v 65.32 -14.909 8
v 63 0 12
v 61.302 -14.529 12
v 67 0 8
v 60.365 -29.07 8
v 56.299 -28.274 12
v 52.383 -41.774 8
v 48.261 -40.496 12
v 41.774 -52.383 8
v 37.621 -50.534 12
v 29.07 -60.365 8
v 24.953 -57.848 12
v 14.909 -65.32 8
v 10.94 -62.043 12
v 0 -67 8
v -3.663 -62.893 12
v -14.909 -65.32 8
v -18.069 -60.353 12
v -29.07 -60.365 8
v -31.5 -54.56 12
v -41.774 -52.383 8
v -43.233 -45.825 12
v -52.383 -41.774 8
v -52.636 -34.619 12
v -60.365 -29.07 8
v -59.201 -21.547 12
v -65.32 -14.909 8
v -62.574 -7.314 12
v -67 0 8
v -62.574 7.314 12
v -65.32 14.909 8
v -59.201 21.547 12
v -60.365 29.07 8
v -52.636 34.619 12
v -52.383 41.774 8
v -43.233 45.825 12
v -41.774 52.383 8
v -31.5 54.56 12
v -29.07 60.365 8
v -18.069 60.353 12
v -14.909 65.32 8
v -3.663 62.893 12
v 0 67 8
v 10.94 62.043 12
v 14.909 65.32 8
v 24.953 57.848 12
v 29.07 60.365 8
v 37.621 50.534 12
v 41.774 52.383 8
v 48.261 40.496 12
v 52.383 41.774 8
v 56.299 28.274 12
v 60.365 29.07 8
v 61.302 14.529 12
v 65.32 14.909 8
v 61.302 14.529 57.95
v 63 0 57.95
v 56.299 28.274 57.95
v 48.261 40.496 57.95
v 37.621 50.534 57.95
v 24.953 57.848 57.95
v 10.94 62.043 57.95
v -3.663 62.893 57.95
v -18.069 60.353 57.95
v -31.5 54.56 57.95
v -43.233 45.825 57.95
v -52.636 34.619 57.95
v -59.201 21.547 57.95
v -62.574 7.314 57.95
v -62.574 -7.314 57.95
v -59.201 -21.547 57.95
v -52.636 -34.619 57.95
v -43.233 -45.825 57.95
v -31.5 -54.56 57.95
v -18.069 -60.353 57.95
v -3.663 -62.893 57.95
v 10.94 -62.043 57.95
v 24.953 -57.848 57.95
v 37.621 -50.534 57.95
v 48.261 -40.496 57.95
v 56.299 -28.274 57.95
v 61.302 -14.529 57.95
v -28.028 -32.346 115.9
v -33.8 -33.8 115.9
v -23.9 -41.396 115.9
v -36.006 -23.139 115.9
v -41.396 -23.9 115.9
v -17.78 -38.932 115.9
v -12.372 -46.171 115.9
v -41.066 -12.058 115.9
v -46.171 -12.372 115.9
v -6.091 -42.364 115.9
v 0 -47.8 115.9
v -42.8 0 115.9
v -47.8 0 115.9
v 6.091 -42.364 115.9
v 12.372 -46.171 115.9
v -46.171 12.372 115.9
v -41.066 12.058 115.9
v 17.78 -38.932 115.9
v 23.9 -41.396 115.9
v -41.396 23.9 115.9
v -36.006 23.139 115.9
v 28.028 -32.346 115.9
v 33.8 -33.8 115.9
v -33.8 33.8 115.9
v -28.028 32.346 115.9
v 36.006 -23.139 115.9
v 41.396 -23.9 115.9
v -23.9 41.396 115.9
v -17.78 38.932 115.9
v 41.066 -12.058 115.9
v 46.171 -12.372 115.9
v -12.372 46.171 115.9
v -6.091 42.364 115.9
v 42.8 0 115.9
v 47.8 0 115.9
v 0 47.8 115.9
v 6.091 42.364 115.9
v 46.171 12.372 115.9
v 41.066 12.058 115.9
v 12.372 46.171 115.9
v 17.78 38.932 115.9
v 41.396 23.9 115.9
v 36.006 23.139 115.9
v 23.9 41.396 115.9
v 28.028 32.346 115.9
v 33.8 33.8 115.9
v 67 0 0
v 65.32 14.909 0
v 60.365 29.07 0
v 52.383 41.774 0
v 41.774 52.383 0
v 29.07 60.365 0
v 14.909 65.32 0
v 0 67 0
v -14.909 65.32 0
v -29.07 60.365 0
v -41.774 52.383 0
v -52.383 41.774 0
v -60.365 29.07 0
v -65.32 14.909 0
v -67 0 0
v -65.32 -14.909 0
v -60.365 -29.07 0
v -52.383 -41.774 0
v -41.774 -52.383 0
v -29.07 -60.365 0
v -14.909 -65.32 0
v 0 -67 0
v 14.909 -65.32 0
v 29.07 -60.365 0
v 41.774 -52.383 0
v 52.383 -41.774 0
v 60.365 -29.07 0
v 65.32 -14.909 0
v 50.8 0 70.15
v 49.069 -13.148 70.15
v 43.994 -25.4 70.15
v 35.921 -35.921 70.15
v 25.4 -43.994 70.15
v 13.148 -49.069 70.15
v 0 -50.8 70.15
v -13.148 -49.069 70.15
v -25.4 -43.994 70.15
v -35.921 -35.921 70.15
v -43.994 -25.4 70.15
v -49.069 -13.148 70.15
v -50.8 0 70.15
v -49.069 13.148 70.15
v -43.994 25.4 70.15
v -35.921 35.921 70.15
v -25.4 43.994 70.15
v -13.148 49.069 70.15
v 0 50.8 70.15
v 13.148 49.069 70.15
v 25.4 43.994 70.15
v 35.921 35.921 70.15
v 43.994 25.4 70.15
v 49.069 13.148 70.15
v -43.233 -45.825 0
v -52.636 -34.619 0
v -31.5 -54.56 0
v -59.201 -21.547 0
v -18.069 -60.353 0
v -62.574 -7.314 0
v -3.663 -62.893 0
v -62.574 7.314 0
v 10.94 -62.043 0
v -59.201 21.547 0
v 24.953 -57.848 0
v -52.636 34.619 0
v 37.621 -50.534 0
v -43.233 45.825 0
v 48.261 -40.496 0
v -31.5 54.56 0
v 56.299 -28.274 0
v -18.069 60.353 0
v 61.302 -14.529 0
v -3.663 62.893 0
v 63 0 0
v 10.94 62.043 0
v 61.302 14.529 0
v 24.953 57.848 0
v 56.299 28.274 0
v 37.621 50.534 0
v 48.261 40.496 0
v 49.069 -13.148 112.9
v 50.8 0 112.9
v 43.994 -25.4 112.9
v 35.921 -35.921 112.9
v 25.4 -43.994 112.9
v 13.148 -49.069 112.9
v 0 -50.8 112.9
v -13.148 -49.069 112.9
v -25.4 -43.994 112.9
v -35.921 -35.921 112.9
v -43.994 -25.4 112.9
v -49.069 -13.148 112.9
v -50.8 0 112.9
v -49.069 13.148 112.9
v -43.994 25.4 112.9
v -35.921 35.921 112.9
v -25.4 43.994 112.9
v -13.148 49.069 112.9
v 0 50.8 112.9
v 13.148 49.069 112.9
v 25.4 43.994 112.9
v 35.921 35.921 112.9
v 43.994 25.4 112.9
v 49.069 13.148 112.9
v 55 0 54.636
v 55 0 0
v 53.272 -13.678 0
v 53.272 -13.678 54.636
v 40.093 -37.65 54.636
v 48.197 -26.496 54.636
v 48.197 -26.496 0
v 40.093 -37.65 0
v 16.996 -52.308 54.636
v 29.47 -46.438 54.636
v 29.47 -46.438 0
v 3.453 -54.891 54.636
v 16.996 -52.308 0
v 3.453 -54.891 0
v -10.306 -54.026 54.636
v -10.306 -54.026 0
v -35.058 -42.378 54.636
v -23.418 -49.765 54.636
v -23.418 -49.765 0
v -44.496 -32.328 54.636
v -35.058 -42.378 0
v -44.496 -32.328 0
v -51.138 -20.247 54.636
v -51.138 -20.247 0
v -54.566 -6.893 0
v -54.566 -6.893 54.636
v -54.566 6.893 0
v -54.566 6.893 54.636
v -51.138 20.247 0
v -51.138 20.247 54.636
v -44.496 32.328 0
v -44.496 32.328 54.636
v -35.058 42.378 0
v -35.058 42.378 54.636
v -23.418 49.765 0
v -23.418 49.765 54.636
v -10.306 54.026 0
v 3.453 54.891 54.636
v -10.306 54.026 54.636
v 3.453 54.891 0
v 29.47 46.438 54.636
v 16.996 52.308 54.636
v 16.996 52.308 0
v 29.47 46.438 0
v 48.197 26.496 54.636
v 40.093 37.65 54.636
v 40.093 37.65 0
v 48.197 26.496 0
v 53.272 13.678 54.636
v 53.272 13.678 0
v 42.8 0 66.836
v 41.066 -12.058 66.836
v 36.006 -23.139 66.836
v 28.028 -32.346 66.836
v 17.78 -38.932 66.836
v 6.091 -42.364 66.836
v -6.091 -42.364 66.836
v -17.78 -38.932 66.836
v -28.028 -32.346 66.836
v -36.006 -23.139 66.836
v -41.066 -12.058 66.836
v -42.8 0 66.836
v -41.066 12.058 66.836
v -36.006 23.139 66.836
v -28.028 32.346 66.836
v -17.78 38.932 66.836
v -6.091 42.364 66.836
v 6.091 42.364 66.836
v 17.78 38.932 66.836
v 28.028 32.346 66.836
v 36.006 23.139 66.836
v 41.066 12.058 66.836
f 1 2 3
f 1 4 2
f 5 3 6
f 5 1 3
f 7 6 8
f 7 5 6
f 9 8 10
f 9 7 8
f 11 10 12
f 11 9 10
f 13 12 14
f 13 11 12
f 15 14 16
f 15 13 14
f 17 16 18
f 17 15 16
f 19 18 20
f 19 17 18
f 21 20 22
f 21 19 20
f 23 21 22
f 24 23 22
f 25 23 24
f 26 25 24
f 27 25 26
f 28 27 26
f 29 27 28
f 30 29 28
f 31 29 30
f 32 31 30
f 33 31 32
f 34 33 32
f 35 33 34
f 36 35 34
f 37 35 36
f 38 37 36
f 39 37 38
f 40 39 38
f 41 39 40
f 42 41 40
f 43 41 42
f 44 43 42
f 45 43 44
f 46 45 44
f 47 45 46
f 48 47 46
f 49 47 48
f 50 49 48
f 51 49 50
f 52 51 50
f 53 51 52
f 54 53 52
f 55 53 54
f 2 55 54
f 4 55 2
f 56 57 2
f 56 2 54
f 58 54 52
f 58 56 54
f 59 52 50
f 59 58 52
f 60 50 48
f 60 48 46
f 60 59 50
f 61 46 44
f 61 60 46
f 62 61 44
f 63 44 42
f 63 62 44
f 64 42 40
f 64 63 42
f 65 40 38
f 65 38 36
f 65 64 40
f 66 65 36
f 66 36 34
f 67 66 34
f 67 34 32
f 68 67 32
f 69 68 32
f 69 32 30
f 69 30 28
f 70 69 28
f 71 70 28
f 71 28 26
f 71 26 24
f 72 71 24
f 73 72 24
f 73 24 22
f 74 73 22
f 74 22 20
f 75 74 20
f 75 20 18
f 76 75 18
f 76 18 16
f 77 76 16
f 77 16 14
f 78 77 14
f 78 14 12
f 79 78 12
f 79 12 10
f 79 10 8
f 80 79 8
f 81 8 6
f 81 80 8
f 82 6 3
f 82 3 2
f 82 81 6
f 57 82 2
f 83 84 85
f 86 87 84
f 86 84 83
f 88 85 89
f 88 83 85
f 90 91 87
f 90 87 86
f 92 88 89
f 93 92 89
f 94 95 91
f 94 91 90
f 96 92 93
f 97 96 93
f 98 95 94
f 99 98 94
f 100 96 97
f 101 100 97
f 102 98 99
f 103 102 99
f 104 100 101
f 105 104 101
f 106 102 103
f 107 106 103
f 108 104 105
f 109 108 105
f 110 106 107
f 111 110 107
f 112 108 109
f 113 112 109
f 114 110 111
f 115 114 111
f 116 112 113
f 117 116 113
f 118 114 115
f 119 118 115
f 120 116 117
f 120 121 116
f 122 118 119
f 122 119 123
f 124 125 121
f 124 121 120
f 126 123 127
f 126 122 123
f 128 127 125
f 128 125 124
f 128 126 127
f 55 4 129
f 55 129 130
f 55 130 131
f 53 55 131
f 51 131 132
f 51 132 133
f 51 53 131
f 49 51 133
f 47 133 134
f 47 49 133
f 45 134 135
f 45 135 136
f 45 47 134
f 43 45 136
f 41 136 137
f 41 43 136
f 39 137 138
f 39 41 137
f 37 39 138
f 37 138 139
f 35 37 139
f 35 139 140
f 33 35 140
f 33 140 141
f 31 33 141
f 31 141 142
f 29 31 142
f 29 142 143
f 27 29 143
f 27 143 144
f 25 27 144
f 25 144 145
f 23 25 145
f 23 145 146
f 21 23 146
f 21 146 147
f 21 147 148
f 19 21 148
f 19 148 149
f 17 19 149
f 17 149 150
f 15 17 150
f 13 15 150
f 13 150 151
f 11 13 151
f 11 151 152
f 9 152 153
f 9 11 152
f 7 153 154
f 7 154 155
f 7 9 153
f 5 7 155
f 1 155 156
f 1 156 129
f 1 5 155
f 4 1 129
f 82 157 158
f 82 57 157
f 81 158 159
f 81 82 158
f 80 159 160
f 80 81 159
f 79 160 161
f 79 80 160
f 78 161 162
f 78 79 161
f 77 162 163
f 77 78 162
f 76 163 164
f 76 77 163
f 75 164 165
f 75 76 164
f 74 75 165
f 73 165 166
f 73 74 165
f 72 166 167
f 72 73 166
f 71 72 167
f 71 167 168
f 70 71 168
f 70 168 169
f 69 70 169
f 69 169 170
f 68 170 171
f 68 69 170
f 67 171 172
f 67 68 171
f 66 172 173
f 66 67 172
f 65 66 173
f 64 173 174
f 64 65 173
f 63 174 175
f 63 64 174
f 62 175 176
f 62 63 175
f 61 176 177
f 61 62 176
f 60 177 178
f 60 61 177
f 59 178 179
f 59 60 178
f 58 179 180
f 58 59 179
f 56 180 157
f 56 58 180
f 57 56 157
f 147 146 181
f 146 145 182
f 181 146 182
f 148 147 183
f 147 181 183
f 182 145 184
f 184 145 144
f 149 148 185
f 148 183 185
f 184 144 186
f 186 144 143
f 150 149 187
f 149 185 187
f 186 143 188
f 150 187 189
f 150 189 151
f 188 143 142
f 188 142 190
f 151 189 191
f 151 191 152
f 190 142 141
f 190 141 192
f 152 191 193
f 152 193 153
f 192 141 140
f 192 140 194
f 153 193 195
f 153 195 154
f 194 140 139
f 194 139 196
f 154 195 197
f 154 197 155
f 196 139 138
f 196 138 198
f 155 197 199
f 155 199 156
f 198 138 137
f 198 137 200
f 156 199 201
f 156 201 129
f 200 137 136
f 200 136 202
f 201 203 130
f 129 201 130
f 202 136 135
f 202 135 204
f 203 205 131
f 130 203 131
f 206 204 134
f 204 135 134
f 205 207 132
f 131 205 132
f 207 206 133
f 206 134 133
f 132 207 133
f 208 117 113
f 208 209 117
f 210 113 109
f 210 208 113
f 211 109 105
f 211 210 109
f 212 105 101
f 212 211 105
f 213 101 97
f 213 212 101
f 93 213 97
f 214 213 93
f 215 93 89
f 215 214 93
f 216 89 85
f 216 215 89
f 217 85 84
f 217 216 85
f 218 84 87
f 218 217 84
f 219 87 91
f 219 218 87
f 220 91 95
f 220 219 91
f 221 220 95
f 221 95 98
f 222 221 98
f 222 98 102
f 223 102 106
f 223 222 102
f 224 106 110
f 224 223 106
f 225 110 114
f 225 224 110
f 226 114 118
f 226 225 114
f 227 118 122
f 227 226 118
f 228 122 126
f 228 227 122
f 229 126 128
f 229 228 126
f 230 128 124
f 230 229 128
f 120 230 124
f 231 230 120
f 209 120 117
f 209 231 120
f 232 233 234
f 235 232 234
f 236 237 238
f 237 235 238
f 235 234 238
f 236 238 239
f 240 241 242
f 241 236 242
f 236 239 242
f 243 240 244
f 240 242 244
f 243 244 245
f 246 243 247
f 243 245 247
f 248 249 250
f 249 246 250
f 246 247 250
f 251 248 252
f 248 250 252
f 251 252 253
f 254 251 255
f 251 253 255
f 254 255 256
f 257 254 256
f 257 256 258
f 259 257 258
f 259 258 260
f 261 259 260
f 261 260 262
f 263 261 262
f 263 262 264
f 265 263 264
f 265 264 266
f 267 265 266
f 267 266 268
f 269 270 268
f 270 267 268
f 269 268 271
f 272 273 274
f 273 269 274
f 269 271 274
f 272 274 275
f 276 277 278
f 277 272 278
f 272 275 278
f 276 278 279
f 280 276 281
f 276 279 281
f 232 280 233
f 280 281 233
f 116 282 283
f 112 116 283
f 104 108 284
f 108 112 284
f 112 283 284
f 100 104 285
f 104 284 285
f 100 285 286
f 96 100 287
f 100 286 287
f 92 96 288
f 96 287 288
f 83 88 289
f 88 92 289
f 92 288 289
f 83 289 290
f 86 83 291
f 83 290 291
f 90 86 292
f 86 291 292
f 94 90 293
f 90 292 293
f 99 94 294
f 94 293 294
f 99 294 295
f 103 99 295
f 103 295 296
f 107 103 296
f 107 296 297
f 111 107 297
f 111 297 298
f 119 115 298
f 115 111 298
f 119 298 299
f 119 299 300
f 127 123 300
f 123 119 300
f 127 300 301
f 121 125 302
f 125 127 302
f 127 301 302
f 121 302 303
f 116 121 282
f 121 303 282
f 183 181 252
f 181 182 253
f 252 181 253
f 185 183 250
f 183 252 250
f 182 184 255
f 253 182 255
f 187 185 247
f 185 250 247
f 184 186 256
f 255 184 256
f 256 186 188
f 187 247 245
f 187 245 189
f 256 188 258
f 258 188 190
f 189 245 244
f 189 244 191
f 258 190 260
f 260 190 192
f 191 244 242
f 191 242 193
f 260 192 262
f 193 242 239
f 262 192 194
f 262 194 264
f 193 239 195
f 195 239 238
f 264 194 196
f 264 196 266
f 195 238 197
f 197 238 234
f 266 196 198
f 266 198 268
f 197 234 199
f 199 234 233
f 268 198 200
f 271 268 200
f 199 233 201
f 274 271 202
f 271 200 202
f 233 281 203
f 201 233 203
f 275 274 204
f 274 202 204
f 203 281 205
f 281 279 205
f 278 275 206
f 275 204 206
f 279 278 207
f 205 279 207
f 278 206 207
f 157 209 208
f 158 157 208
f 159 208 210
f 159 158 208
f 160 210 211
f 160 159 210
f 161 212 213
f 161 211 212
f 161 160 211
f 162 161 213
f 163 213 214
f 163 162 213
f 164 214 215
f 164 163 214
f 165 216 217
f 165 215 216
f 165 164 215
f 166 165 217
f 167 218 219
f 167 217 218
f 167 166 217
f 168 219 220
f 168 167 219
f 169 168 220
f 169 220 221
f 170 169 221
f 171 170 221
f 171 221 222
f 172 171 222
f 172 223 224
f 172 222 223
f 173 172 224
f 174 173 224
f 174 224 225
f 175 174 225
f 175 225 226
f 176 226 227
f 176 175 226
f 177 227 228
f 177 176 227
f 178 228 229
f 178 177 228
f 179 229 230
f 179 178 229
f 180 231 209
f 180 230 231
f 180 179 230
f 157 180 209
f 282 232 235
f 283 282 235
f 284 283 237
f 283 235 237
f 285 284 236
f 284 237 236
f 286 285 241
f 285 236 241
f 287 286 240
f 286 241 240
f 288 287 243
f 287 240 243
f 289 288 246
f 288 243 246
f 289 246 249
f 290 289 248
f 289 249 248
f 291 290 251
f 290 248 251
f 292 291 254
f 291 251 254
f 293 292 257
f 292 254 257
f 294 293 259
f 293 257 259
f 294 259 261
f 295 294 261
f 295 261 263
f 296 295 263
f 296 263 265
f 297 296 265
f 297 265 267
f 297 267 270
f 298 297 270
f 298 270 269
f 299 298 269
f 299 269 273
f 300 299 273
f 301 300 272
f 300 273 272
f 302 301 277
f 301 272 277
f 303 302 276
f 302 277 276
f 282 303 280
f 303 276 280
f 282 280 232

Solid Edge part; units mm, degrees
sketch "Sketch1" plane through (0, 0, 0) normal (0, -1, 0) x (1, 0, 0)
  line L0 (42.8, 115.9) -> (42.8, 66.8363)
  line L1 (42.8, 66.8363) -> (55, 54.6363)
  line L2 (55, 54.6363) -> (55, 0)
  line L3 (55, 0) -> (63, 0)
  line L4 (63, 0) -> (67, 0)
  line L5 (67, 0) -> (67, 8)
  line L6 (67, 8) -> (63, 12)
  line L7 (63, 12) -> (63, 57.95)
  line L8 (63, 57.95) -> (50.8, 70.15)
  line L9 (50.8, 115.9) -> (50.8, 70.15)
  line L10 (42.8, 115.9) -> (50.8, 115.9)
revolve "RevolvedProtrusion1" add sketch "Sketch1" angle 360 about axis through (0, 0, 0) along (0, 0, 1)
chamfer "Chamfer1" distance 3 angle 45 1 edges at (-50.8, 0, 115.9)
